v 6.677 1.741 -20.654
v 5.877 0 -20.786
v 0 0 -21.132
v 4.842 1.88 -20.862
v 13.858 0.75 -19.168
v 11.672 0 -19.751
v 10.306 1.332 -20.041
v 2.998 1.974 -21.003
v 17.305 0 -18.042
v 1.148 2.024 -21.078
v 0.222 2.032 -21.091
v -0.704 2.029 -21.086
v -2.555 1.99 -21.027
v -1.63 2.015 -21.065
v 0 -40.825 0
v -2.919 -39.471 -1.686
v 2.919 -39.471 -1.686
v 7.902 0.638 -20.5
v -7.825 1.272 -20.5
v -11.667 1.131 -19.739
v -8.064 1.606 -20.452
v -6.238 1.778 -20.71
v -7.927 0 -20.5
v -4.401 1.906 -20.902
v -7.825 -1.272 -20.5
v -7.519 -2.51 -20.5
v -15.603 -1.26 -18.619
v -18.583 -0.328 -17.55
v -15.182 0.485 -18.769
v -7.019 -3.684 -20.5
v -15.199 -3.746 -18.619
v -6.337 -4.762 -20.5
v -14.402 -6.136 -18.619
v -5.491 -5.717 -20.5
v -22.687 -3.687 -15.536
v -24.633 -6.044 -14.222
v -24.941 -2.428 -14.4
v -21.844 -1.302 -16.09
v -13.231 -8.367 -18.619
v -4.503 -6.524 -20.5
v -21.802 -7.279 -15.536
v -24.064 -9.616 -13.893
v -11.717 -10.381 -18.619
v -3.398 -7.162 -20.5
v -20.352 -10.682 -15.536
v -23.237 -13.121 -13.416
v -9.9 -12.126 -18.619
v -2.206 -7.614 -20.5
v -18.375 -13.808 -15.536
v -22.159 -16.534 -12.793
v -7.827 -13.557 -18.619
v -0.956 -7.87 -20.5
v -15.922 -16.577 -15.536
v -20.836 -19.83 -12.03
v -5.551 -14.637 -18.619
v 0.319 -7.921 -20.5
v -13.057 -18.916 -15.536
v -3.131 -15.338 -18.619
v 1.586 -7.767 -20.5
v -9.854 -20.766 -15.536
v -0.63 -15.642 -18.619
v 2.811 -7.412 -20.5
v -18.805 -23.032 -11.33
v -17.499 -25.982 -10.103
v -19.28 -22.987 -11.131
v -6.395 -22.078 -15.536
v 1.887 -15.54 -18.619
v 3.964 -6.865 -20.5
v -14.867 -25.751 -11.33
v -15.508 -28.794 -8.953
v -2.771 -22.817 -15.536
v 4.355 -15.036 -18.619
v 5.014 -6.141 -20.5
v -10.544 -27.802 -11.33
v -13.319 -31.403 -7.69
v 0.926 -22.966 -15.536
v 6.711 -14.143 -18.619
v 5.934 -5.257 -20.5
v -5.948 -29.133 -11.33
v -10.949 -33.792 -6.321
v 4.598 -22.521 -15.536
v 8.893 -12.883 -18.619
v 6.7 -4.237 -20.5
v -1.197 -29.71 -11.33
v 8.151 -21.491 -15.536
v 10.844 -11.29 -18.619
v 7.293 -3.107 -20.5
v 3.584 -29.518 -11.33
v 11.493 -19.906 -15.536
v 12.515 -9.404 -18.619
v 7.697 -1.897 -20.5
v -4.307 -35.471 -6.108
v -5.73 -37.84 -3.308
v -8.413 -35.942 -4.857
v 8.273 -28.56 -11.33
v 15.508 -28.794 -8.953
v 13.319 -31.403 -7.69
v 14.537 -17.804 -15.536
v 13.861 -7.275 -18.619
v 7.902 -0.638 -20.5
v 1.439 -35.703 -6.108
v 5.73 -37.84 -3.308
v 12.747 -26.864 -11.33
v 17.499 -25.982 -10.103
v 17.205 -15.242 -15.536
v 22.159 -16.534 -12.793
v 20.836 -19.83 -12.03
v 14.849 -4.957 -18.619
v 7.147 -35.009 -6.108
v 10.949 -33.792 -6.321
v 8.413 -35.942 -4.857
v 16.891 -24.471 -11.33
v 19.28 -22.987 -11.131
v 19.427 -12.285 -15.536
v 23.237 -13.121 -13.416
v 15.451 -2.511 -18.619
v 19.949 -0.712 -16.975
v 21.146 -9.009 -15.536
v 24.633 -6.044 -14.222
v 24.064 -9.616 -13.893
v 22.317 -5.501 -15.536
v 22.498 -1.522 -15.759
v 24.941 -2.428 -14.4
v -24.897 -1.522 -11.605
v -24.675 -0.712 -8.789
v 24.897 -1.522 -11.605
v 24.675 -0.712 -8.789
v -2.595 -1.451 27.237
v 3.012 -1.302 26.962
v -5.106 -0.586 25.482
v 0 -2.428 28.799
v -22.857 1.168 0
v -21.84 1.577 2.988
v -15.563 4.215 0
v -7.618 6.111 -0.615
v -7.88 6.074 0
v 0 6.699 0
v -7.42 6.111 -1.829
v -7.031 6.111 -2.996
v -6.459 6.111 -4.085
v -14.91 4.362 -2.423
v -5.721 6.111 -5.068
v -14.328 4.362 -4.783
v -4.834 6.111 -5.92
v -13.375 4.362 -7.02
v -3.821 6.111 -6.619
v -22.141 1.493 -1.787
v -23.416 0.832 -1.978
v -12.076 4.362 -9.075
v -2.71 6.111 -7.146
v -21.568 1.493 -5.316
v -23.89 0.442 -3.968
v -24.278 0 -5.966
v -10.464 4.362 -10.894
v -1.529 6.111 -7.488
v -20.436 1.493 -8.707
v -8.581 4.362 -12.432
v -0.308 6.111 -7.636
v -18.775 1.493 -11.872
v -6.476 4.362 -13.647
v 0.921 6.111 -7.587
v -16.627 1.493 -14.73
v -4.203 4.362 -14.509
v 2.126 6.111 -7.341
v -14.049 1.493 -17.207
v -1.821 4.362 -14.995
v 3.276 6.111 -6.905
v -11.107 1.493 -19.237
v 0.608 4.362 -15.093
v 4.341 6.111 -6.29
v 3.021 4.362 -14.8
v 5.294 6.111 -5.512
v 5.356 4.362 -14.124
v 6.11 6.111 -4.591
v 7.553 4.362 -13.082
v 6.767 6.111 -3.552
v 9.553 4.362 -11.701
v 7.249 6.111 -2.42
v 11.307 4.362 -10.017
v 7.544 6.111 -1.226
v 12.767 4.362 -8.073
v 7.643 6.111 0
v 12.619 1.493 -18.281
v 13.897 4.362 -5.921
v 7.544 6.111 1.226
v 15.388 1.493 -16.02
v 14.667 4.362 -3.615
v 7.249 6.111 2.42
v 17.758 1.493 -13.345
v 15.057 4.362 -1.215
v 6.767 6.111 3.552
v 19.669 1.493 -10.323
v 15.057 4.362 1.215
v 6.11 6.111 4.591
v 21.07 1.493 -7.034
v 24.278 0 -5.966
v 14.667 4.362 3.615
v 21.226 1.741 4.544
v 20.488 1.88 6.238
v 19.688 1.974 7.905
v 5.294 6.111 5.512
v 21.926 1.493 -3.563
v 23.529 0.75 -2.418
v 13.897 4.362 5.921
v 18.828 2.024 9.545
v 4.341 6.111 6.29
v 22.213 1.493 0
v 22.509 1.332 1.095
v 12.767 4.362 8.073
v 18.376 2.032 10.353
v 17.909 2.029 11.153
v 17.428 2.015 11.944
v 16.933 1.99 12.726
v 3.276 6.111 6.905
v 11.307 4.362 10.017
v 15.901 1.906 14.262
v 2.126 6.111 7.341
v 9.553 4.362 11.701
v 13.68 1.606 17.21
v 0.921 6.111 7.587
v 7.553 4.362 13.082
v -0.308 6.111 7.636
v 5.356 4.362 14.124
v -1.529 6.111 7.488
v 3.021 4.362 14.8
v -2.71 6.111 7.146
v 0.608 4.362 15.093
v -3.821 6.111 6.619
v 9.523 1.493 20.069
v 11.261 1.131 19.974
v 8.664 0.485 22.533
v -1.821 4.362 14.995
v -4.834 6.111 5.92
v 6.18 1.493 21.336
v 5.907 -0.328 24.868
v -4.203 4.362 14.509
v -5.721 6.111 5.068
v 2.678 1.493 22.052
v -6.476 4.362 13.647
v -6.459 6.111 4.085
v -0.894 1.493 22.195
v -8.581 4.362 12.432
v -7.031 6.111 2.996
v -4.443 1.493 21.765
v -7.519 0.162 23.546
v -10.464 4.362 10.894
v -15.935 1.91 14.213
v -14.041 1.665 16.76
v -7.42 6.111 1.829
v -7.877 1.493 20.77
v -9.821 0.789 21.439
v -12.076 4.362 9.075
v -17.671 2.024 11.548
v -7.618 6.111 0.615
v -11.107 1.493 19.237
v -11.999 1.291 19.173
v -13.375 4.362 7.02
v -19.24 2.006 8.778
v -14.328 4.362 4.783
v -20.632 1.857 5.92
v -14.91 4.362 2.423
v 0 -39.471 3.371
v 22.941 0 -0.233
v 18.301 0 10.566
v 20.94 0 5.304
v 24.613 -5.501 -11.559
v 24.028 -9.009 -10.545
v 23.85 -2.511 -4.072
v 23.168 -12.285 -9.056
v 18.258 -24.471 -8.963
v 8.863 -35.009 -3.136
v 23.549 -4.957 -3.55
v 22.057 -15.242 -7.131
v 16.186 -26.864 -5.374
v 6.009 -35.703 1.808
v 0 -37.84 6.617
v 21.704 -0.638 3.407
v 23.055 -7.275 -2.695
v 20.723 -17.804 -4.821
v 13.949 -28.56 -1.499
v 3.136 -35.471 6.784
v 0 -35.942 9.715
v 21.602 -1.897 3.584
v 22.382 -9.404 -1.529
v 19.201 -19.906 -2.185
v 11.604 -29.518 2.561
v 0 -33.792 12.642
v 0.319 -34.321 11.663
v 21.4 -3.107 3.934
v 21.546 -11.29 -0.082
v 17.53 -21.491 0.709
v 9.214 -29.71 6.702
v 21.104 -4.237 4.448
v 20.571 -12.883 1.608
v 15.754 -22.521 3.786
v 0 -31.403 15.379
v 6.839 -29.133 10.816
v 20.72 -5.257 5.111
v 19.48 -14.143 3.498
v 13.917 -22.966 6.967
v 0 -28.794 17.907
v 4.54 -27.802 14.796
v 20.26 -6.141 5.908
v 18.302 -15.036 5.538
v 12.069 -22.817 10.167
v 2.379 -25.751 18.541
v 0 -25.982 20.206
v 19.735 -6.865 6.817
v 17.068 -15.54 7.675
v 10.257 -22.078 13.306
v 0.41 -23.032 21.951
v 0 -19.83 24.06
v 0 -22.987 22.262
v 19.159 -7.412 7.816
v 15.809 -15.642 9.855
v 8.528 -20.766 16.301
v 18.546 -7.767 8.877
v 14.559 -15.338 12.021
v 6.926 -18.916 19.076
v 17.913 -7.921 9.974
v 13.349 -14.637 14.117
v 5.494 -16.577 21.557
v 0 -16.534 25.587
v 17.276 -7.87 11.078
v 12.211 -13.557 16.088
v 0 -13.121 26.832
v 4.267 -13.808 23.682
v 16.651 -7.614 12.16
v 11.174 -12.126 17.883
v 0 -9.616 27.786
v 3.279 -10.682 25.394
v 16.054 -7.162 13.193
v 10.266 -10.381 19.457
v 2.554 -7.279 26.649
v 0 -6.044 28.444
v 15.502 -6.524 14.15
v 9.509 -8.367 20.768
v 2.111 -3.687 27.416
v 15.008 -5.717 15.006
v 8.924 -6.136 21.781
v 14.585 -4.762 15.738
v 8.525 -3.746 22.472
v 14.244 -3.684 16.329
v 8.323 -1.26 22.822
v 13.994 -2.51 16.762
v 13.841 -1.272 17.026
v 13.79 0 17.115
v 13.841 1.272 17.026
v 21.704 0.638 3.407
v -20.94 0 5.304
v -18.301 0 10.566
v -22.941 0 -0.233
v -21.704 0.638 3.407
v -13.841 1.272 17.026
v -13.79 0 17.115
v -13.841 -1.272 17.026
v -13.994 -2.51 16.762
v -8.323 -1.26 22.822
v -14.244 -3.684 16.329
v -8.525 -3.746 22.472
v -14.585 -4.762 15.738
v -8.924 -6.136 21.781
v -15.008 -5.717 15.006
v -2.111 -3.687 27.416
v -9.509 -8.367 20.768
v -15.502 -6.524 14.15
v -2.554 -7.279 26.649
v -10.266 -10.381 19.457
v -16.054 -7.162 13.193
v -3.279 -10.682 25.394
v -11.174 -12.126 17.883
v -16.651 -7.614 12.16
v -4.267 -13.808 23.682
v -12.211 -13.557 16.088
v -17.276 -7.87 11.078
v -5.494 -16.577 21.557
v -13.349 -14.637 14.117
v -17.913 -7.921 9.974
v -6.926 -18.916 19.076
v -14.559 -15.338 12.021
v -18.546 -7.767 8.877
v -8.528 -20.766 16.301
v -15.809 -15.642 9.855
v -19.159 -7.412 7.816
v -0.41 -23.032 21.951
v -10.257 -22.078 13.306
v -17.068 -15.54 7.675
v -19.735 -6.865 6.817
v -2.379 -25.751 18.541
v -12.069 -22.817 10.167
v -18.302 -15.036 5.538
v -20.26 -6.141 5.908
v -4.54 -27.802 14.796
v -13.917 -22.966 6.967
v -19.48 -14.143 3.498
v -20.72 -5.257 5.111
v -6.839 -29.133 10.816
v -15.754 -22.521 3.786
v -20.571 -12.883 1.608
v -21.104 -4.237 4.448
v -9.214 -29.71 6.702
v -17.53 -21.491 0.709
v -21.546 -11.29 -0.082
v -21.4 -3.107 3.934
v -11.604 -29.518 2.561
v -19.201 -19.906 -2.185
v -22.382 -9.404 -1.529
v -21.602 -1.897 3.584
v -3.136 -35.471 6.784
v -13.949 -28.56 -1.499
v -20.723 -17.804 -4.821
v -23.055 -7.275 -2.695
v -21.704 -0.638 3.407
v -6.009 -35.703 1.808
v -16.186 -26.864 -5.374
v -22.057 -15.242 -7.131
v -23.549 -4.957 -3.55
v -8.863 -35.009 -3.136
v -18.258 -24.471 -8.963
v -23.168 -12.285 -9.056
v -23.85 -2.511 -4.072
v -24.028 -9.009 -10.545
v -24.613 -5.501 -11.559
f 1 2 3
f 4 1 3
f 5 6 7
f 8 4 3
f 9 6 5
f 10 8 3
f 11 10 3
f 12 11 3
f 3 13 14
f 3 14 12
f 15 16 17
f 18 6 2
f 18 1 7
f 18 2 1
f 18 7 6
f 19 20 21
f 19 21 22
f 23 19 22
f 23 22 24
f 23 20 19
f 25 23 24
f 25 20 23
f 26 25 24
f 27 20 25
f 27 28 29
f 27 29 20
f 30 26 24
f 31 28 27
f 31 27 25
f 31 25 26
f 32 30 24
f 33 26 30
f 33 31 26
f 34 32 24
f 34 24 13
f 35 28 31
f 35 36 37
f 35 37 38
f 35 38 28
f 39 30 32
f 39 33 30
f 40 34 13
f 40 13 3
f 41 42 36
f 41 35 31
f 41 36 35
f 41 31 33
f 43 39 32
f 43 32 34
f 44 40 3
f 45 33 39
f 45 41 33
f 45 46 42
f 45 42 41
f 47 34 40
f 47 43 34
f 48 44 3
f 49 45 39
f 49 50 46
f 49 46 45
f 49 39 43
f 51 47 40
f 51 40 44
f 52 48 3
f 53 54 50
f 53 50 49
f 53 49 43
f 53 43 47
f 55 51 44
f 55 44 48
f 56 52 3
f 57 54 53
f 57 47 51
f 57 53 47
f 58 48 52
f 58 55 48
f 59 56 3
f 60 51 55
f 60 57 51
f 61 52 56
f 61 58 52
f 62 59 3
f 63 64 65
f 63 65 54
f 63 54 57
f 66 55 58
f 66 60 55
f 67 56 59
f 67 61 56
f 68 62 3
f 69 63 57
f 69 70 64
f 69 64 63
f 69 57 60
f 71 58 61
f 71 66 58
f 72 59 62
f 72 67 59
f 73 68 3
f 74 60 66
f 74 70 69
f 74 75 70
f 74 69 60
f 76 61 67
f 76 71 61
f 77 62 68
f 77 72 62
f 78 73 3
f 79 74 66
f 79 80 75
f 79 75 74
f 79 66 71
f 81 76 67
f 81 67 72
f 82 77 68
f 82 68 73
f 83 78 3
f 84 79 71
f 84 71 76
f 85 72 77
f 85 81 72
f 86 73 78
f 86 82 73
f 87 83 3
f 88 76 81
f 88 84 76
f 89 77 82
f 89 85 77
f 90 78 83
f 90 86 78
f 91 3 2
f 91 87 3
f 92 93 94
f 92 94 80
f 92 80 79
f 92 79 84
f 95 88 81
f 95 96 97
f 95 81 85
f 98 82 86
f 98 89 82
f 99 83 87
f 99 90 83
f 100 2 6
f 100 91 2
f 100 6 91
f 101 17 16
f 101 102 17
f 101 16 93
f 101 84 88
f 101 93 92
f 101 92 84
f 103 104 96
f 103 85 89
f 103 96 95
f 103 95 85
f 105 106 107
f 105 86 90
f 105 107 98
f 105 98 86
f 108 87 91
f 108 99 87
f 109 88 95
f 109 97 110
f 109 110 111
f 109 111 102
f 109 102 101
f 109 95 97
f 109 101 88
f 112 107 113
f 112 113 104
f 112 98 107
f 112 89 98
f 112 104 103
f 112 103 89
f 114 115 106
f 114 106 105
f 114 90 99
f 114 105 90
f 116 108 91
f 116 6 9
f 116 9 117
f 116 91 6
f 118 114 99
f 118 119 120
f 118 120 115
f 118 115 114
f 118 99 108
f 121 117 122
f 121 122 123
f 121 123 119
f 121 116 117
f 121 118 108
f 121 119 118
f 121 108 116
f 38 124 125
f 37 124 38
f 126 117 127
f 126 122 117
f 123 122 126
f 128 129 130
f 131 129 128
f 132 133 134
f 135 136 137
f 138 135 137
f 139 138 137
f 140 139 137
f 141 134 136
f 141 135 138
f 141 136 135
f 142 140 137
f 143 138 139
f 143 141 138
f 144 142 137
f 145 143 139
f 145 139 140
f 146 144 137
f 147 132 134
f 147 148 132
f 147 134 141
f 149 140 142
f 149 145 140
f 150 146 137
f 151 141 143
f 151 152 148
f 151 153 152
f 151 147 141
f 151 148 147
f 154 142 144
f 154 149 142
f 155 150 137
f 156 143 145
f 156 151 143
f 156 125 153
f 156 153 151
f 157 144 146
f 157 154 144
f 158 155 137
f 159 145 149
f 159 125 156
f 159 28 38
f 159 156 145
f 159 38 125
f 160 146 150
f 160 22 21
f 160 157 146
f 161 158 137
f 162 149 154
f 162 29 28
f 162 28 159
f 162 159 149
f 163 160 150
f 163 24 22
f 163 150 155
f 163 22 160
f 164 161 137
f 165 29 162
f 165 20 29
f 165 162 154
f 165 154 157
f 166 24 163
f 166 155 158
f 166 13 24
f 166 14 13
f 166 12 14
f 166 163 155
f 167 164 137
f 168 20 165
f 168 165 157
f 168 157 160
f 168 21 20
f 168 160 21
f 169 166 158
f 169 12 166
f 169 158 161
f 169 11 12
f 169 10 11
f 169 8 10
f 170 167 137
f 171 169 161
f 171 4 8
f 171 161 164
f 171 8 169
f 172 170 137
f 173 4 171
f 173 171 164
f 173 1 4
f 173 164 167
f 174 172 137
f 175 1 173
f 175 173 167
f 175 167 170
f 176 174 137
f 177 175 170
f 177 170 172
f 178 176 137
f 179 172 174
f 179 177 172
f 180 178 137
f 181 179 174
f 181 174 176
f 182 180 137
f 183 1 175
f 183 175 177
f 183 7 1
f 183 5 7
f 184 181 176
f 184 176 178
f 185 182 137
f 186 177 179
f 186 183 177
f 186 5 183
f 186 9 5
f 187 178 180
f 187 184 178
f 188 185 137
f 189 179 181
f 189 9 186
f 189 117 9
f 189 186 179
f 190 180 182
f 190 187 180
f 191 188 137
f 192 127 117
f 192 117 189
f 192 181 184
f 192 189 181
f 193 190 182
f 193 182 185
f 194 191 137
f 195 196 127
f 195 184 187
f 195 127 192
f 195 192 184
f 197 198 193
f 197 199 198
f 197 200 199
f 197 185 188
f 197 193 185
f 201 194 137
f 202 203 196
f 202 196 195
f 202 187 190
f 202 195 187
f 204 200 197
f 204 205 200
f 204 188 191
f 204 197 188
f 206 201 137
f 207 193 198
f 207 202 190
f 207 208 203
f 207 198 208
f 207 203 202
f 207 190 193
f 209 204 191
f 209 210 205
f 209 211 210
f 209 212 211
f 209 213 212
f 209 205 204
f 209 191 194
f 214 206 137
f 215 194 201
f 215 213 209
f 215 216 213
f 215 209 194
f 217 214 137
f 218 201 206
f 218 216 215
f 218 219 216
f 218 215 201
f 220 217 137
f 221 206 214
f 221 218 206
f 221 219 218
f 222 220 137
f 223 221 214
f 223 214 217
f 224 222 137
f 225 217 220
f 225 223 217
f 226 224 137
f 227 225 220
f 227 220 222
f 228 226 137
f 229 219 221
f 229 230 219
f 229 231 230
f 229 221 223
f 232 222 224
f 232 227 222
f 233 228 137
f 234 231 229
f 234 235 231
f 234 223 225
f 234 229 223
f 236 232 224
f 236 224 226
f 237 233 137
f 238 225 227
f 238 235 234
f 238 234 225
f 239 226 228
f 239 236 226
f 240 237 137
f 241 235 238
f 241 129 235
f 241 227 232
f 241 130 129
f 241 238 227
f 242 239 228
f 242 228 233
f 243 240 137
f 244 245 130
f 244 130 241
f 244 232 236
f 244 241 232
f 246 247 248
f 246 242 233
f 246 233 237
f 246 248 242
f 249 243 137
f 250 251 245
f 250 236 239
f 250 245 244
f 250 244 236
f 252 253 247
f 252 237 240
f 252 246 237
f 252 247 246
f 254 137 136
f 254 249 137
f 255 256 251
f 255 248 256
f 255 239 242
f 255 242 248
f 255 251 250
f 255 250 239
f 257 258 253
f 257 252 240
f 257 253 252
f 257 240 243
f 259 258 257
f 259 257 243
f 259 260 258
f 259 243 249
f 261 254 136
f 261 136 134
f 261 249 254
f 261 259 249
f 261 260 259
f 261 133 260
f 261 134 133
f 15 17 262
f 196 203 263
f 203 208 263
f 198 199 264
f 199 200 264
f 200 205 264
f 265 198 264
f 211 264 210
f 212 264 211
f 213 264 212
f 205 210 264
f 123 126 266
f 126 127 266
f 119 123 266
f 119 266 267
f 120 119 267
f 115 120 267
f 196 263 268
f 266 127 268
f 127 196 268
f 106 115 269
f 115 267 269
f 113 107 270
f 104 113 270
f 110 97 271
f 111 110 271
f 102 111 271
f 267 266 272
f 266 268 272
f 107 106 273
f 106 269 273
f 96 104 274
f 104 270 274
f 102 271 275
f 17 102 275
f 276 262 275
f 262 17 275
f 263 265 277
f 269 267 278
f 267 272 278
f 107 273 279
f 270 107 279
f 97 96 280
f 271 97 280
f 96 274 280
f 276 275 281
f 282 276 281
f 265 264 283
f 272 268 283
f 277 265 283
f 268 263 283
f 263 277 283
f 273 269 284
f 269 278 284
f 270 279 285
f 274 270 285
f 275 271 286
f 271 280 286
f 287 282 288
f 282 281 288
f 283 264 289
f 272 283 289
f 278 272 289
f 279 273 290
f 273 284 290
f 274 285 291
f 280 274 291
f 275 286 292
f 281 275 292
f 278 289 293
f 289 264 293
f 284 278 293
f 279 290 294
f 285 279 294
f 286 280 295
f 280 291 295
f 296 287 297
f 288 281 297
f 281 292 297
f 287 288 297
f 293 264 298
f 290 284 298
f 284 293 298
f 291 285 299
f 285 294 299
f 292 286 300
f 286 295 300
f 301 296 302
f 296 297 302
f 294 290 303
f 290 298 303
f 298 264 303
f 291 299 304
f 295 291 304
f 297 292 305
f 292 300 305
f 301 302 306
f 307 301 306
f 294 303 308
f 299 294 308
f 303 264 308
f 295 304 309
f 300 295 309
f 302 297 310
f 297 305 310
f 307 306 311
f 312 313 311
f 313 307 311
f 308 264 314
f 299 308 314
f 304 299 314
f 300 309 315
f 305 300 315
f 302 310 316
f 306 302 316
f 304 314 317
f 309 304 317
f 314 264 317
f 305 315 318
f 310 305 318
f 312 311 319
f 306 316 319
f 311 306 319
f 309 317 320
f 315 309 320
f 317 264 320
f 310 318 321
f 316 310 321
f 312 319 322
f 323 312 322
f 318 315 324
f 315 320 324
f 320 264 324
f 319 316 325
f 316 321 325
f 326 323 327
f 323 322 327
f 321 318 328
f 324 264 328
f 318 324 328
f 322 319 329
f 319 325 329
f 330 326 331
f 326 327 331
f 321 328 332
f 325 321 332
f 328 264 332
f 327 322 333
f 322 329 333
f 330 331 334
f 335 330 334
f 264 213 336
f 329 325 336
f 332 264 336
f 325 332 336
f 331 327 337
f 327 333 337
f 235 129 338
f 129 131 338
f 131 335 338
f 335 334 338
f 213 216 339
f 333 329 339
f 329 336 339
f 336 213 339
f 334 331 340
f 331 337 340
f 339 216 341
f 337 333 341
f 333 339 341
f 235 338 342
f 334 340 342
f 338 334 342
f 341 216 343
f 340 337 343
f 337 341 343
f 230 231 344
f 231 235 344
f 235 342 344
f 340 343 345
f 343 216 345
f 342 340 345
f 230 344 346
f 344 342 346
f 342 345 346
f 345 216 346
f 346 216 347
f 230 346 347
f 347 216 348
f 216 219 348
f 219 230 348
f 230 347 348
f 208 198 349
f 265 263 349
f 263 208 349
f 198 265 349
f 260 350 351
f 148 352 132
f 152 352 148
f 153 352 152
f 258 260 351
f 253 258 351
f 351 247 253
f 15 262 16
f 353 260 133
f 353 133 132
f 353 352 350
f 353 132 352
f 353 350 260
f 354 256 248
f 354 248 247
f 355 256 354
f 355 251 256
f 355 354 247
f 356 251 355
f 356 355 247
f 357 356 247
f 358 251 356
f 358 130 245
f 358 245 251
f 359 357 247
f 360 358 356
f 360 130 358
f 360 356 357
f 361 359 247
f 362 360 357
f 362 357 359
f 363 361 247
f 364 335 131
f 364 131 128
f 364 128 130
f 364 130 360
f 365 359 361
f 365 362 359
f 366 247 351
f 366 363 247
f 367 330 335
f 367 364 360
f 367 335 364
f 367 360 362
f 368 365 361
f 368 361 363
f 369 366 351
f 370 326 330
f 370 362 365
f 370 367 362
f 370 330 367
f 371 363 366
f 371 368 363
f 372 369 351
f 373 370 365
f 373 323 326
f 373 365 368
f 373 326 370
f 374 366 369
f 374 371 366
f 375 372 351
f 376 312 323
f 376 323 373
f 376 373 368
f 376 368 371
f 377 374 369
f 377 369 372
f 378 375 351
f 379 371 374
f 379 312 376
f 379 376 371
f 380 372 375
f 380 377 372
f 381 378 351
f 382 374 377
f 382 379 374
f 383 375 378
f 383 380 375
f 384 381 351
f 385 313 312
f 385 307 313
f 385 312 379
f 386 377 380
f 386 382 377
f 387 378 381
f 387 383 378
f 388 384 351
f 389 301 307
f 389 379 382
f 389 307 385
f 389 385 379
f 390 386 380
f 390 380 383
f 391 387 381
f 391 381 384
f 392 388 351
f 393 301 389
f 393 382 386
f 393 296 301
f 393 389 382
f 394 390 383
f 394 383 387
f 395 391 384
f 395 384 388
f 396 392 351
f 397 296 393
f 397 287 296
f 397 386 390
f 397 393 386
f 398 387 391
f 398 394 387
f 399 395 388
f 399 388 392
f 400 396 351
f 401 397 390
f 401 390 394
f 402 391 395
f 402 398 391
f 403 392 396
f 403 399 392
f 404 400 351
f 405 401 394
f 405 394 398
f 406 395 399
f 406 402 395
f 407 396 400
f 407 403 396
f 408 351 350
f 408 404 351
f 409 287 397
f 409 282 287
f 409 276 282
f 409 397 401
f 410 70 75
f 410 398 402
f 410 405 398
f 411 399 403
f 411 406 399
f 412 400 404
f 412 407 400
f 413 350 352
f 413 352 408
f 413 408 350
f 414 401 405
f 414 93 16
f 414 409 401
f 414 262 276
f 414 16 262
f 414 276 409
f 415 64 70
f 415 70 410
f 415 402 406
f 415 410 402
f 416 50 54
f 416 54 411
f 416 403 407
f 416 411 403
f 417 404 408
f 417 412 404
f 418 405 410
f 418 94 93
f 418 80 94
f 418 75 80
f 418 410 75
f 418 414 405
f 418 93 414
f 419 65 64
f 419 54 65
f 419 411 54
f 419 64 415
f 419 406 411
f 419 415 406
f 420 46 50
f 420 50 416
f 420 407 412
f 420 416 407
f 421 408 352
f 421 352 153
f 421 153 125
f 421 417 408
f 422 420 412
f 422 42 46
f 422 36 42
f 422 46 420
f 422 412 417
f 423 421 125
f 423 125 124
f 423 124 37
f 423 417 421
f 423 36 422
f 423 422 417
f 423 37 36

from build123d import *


with BuildPart() as f2:
    # F1 (on Front) → F2 (revolve)
    with BuildSketch(Plane.XZ):
        with BuildLine():
            Line((0, 78.8675134595), (0, -21.1324865405))
            ThreePointArc((0, -21.1324865405), (50, 28.8675134595), (0, 78.8675134595))
        make_face()
    revolve(axis=Axis((0, 0, 42.5087921321), (0, 0, 1)))


with BuildPart() as f4:
    # F3 (on Front) → F4 (revolve)
    with BuildSketch(Plane.XZ):
        with BuildLine():
            Line((18.3012701892, 10.5662432703), (-68.3012701892, -39.4337567297))
            ThreePointArc((-68.3012701892, -39.4337567297), (0, -57.735026919), (18.3012701892, 10.5662432703))
        make_face()
    revolve(axis=Axis((-48.7220736529, 0, -28.129702339), (-0.8660254038, 0, -0.5)))


with BuildPart() as f6:
    # F5 (on Front) → F6 (revolve)
    with BuildSketch(Plane.XZ):
        with BuildLine():
            Line((68.3012701892, -39.4337567297), (-18.3012701892, 10.5662432703))
            ThreePointArc((-18.3012701892, 10.5662432703), (0, -57.735026919), (68.3012701892, -39.4337567297))
        make_face()
    revolve(axis=Axis((48.6017106384, 0, -28.0602107202), (0.8660254038, 0, -0.5)))


with BuildPart() as f10:
    # F9 (on Top) → F10 (revolve)
    with BuildSketch(Plane.XY):
        with BuildLine():
            Line((0, -93.3012701892), (0, 6.6987298108))
            ThreePointArc((0, 6.6987298108), (-50, -43.3012701892), (0, -93.3012701892))
        make_face()
    revolve(axis=Axis((0, -54.9783110619, 0), (0, -1, 0)))


with BuildPart() as f2_1:
    add(f2.part)

    # F11: intersect F4, F6, F10
    add(f4.part, mode=Mode.INTERSECT)
    add(f6.part, mode=Mode.INTERSECT)
    add(f10.part, mode=Mode.INTERSECT)


solid = f2_1.part
